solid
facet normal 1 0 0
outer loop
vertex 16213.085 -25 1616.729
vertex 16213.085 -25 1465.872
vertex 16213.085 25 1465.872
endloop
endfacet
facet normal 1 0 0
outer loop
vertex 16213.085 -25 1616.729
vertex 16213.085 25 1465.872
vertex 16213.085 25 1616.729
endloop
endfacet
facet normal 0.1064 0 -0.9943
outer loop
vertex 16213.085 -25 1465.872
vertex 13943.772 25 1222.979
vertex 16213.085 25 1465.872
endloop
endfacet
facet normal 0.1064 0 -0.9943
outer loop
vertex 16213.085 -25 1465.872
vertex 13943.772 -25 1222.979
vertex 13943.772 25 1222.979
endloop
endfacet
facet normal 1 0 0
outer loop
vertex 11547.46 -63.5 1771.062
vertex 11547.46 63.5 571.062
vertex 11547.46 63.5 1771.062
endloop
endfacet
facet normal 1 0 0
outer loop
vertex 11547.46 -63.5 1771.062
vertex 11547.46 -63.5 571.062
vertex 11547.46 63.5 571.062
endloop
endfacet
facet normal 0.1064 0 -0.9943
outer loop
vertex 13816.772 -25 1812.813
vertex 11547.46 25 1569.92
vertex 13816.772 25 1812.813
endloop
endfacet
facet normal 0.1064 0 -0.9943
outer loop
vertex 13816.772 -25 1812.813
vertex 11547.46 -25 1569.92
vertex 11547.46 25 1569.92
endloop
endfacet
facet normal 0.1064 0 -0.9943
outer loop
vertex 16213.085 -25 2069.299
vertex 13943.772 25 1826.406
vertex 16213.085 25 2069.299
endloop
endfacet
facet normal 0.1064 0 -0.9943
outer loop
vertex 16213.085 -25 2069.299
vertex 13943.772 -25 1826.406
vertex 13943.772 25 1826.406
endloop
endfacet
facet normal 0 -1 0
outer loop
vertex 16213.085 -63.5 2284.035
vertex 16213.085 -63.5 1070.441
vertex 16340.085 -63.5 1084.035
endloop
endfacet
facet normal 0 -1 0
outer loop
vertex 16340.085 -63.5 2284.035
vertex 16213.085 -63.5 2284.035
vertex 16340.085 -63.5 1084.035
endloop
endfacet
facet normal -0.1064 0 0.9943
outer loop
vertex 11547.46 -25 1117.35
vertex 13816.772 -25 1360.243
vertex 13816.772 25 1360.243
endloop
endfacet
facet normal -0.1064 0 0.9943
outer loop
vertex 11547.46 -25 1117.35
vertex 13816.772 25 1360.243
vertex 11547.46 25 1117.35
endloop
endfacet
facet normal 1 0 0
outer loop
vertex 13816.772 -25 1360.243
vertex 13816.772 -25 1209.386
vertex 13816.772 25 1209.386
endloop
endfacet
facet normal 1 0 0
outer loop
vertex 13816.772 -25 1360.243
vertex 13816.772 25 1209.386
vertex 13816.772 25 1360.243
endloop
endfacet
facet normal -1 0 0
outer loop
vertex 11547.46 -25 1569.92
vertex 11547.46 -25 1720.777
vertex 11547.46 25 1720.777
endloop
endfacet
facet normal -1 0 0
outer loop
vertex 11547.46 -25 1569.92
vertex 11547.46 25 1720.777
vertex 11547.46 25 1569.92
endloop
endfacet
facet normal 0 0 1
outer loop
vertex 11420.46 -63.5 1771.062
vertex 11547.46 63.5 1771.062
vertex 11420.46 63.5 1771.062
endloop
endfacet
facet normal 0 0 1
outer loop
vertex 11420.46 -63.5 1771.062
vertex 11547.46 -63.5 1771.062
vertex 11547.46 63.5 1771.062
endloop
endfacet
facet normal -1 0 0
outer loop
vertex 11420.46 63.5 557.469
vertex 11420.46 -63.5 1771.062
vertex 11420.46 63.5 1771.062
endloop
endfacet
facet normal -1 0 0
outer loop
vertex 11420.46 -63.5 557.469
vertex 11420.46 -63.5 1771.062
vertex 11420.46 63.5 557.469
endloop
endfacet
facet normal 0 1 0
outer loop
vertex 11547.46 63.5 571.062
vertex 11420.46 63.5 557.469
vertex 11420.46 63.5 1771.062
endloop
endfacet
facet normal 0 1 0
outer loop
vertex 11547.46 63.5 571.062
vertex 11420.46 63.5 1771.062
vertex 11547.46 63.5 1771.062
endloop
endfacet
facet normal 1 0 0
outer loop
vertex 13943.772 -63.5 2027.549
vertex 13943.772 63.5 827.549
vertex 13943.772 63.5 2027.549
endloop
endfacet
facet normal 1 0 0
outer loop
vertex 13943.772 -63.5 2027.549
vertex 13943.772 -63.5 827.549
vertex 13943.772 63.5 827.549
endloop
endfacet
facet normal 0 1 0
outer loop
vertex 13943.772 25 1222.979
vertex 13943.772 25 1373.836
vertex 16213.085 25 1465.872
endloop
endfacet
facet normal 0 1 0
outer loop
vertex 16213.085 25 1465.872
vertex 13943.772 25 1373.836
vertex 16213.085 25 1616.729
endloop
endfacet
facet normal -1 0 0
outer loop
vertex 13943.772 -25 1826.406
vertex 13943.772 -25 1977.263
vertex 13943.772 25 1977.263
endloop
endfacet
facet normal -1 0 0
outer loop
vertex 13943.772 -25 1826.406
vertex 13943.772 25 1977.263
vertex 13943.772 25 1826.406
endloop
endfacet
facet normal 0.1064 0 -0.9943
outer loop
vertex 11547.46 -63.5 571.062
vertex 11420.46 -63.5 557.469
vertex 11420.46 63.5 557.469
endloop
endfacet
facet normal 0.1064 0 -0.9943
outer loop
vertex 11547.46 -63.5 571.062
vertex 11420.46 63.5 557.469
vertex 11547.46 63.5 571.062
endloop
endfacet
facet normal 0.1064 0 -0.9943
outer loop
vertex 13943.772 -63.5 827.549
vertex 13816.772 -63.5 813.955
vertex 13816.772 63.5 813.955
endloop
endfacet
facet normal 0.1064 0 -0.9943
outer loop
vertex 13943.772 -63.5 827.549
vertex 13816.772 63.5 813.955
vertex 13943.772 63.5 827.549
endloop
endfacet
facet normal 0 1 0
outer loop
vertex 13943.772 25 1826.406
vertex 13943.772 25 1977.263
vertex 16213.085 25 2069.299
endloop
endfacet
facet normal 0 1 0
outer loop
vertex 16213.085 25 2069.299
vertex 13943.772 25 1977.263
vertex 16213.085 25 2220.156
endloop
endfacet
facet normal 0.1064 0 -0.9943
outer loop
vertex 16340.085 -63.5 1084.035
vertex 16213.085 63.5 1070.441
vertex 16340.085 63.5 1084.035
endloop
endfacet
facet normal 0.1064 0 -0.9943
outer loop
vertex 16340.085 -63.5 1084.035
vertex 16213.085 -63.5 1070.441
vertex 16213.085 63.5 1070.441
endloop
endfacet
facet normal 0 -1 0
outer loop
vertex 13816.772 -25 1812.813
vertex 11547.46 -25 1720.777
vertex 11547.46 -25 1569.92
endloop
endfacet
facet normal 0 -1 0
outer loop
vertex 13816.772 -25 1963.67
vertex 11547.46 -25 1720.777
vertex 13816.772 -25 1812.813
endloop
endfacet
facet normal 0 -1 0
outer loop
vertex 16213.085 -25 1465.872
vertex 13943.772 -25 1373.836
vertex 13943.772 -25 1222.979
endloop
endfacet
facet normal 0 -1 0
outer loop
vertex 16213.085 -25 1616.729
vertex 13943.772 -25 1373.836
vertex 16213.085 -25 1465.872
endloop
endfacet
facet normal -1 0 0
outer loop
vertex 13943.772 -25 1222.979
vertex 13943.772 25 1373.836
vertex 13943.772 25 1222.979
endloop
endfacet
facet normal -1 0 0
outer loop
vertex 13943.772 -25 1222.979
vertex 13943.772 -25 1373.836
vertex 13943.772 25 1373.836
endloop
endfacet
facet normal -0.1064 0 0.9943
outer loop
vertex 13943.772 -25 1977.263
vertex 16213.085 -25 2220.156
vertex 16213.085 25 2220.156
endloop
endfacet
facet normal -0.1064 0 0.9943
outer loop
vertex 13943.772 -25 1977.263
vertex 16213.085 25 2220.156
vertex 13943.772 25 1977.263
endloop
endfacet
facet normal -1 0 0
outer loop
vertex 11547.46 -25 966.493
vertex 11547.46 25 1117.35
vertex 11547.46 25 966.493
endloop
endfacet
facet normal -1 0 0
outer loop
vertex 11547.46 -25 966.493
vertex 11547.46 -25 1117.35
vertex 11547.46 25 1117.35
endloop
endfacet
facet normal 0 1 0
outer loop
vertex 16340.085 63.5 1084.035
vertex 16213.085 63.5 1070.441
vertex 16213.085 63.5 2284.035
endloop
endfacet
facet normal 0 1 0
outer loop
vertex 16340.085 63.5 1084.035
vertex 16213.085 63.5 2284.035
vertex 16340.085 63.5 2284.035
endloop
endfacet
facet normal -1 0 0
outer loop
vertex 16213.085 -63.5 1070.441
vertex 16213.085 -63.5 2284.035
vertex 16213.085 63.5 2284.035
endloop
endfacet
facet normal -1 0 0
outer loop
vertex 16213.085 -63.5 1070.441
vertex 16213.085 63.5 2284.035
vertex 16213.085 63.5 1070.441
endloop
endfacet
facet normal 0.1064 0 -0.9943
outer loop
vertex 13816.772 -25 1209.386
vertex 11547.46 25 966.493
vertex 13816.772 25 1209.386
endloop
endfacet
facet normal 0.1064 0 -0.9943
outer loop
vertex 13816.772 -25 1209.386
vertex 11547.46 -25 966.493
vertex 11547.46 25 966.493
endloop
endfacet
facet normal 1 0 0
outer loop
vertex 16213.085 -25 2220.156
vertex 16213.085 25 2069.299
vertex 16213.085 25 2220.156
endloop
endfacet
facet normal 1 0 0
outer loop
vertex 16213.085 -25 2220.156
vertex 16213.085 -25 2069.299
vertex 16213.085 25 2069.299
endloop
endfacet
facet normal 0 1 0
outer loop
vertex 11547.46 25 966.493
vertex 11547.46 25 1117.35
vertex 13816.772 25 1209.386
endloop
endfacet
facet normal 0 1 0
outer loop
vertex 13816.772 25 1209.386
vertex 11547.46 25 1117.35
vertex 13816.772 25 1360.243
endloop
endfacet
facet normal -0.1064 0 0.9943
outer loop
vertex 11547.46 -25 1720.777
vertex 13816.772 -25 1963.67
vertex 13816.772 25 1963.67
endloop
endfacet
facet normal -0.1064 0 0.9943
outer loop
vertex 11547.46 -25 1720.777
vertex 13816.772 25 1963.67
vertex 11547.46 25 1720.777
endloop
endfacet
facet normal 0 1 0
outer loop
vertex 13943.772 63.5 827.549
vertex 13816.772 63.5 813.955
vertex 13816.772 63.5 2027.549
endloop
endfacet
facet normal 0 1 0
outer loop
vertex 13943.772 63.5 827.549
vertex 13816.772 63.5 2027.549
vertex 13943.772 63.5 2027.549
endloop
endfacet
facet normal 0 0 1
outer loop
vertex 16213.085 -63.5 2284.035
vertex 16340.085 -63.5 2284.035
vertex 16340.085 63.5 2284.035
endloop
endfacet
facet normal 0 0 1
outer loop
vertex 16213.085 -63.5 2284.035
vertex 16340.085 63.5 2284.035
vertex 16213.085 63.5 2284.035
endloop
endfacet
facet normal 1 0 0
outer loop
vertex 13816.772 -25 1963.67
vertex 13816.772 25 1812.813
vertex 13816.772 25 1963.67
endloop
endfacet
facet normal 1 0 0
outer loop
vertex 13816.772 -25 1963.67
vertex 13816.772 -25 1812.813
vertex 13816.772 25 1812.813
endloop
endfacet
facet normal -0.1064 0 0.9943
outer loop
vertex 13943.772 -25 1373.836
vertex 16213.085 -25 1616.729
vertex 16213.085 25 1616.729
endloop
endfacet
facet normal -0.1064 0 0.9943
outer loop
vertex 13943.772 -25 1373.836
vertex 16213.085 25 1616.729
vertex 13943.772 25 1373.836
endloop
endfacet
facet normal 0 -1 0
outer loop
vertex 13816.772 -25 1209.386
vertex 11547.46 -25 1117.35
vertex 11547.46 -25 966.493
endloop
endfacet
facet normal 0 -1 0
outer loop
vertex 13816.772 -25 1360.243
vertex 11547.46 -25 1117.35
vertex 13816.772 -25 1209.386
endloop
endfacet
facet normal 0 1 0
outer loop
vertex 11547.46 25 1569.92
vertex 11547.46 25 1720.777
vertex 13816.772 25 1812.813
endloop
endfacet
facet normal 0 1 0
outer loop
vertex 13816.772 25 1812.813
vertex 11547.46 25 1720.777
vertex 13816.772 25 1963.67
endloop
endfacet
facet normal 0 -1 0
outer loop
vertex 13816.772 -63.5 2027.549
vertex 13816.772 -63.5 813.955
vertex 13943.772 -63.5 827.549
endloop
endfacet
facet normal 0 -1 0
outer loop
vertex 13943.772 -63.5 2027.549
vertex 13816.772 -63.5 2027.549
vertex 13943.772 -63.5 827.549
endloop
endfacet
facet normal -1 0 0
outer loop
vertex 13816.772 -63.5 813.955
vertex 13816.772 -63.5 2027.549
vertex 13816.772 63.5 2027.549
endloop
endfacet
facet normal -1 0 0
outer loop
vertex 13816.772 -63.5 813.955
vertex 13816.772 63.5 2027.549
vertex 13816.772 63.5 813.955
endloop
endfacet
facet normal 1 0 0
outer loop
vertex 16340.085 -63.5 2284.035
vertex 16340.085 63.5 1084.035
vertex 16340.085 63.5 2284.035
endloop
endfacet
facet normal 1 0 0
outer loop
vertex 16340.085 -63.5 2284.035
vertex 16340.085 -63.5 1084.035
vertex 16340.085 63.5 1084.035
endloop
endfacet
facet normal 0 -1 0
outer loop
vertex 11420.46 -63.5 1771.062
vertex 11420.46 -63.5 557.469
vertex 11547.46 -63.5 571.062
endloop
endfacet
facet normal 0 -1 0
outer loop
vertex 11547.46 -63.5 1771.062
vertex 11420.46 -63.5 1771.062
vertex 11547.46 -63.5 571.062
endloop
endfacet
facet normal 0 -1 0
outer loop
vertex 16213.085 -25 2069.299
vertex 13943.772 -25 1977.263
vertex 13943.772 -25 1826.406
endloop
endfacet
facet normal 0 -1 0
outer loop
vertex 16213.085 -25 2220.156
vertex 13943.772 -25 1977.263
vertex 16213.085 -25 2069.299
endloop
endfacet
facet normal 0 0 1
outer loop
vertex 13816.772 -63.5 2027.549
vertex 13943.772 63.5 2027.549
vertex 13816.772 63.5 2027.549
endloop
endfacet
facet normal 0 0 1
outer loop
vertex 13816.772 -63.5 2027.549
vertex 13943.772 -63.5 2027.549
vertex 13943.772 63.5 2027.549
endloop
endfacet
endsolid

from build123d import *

# Parameters (mm, degrees)
F1_DEPTH      = 63.5
F1_DEPTH_BACK = 63.5
F2_DEPTH      = 25
F2_DEPTH_BACK = 25


with BuildPart() as f1:
    # F0 (on Front) → F1 (new body, two sides)
    with BuildSketch(Plane.XZ) as f1_sk:
        Polygon((11547.459713, 1569.920109), (11547.459713, 1720.776877), (11547.459713, 1771.062466), (11420.459713, 1771.062466), (11420.459713, 557.469194), (11547.459713, 571.062466), (11547.459713, 966.493036), (11547.459713, 1117.349804), align=None)
        Polygon((16340.085253, 1084.034619), (16340.085253, 2284.034619), (16213.085253, 2284.034619), (16213.085253, 2220.155757), (16213.085253, 2069.298989), (16213.085253, 1616.728685), (16213.085253, 1465.871916), (16213.085253, 1070.441347), align=None)
        Polygon((13943.772483, 1826.406185), (13943.772483, 1977.262953), (13943.772483, 2027.548542), (13816.772483, 2027.548542), (13816.772483, 1963.669681), (13816.772483, 1812.812913), (13816.772483, 1360.242608), (13816.772483, 1209.38584), (13816.772483, 813.95527), (13943.772483, 827.548542), (13943.772483, 1222.979112), (13943.772483, 1373.83588), align=None)
    extrude(amount=F1_DEPTH)
    extrude(f1_sk.sketch, amount=-F1_DEPTH_BACK)


with BuildPart() as f2:
    # F0 (on Front) → F2 (new body, two sides)
    with BuildSketch(Plane.XZ) as f2_sk:
        Polygon((13816.772483, 1812.812913), (13816.772483, 1963.669681), (11547.459713, 1720.776877), (11547.459713, 1569.920109), align=None)
        Polygon((11547.459713, 966.493036), (13816.772483, 1209.38584), (13816.772483, 1360.242608), (11547.459713, 1117.349804), align=None)
        Polygon((13943.772483, 1222.979112), (16213.085253, 1465.871916), (16213.085253, 1616.728685), (13943.772483, 1373.83588), align=None)
        Polygon((16213.085253, 2069.298989), (16213.085253, 2220.155757), (13943.772483, 1977.262953), (13943.772483, 1826.406185), align=None)
    extrude(amount=F2_DEPTH)
    extrude(f2_sk.sketch, amount=-F2_DEPTH_BACK)


solid = Compound([f1.part, f2.part])
